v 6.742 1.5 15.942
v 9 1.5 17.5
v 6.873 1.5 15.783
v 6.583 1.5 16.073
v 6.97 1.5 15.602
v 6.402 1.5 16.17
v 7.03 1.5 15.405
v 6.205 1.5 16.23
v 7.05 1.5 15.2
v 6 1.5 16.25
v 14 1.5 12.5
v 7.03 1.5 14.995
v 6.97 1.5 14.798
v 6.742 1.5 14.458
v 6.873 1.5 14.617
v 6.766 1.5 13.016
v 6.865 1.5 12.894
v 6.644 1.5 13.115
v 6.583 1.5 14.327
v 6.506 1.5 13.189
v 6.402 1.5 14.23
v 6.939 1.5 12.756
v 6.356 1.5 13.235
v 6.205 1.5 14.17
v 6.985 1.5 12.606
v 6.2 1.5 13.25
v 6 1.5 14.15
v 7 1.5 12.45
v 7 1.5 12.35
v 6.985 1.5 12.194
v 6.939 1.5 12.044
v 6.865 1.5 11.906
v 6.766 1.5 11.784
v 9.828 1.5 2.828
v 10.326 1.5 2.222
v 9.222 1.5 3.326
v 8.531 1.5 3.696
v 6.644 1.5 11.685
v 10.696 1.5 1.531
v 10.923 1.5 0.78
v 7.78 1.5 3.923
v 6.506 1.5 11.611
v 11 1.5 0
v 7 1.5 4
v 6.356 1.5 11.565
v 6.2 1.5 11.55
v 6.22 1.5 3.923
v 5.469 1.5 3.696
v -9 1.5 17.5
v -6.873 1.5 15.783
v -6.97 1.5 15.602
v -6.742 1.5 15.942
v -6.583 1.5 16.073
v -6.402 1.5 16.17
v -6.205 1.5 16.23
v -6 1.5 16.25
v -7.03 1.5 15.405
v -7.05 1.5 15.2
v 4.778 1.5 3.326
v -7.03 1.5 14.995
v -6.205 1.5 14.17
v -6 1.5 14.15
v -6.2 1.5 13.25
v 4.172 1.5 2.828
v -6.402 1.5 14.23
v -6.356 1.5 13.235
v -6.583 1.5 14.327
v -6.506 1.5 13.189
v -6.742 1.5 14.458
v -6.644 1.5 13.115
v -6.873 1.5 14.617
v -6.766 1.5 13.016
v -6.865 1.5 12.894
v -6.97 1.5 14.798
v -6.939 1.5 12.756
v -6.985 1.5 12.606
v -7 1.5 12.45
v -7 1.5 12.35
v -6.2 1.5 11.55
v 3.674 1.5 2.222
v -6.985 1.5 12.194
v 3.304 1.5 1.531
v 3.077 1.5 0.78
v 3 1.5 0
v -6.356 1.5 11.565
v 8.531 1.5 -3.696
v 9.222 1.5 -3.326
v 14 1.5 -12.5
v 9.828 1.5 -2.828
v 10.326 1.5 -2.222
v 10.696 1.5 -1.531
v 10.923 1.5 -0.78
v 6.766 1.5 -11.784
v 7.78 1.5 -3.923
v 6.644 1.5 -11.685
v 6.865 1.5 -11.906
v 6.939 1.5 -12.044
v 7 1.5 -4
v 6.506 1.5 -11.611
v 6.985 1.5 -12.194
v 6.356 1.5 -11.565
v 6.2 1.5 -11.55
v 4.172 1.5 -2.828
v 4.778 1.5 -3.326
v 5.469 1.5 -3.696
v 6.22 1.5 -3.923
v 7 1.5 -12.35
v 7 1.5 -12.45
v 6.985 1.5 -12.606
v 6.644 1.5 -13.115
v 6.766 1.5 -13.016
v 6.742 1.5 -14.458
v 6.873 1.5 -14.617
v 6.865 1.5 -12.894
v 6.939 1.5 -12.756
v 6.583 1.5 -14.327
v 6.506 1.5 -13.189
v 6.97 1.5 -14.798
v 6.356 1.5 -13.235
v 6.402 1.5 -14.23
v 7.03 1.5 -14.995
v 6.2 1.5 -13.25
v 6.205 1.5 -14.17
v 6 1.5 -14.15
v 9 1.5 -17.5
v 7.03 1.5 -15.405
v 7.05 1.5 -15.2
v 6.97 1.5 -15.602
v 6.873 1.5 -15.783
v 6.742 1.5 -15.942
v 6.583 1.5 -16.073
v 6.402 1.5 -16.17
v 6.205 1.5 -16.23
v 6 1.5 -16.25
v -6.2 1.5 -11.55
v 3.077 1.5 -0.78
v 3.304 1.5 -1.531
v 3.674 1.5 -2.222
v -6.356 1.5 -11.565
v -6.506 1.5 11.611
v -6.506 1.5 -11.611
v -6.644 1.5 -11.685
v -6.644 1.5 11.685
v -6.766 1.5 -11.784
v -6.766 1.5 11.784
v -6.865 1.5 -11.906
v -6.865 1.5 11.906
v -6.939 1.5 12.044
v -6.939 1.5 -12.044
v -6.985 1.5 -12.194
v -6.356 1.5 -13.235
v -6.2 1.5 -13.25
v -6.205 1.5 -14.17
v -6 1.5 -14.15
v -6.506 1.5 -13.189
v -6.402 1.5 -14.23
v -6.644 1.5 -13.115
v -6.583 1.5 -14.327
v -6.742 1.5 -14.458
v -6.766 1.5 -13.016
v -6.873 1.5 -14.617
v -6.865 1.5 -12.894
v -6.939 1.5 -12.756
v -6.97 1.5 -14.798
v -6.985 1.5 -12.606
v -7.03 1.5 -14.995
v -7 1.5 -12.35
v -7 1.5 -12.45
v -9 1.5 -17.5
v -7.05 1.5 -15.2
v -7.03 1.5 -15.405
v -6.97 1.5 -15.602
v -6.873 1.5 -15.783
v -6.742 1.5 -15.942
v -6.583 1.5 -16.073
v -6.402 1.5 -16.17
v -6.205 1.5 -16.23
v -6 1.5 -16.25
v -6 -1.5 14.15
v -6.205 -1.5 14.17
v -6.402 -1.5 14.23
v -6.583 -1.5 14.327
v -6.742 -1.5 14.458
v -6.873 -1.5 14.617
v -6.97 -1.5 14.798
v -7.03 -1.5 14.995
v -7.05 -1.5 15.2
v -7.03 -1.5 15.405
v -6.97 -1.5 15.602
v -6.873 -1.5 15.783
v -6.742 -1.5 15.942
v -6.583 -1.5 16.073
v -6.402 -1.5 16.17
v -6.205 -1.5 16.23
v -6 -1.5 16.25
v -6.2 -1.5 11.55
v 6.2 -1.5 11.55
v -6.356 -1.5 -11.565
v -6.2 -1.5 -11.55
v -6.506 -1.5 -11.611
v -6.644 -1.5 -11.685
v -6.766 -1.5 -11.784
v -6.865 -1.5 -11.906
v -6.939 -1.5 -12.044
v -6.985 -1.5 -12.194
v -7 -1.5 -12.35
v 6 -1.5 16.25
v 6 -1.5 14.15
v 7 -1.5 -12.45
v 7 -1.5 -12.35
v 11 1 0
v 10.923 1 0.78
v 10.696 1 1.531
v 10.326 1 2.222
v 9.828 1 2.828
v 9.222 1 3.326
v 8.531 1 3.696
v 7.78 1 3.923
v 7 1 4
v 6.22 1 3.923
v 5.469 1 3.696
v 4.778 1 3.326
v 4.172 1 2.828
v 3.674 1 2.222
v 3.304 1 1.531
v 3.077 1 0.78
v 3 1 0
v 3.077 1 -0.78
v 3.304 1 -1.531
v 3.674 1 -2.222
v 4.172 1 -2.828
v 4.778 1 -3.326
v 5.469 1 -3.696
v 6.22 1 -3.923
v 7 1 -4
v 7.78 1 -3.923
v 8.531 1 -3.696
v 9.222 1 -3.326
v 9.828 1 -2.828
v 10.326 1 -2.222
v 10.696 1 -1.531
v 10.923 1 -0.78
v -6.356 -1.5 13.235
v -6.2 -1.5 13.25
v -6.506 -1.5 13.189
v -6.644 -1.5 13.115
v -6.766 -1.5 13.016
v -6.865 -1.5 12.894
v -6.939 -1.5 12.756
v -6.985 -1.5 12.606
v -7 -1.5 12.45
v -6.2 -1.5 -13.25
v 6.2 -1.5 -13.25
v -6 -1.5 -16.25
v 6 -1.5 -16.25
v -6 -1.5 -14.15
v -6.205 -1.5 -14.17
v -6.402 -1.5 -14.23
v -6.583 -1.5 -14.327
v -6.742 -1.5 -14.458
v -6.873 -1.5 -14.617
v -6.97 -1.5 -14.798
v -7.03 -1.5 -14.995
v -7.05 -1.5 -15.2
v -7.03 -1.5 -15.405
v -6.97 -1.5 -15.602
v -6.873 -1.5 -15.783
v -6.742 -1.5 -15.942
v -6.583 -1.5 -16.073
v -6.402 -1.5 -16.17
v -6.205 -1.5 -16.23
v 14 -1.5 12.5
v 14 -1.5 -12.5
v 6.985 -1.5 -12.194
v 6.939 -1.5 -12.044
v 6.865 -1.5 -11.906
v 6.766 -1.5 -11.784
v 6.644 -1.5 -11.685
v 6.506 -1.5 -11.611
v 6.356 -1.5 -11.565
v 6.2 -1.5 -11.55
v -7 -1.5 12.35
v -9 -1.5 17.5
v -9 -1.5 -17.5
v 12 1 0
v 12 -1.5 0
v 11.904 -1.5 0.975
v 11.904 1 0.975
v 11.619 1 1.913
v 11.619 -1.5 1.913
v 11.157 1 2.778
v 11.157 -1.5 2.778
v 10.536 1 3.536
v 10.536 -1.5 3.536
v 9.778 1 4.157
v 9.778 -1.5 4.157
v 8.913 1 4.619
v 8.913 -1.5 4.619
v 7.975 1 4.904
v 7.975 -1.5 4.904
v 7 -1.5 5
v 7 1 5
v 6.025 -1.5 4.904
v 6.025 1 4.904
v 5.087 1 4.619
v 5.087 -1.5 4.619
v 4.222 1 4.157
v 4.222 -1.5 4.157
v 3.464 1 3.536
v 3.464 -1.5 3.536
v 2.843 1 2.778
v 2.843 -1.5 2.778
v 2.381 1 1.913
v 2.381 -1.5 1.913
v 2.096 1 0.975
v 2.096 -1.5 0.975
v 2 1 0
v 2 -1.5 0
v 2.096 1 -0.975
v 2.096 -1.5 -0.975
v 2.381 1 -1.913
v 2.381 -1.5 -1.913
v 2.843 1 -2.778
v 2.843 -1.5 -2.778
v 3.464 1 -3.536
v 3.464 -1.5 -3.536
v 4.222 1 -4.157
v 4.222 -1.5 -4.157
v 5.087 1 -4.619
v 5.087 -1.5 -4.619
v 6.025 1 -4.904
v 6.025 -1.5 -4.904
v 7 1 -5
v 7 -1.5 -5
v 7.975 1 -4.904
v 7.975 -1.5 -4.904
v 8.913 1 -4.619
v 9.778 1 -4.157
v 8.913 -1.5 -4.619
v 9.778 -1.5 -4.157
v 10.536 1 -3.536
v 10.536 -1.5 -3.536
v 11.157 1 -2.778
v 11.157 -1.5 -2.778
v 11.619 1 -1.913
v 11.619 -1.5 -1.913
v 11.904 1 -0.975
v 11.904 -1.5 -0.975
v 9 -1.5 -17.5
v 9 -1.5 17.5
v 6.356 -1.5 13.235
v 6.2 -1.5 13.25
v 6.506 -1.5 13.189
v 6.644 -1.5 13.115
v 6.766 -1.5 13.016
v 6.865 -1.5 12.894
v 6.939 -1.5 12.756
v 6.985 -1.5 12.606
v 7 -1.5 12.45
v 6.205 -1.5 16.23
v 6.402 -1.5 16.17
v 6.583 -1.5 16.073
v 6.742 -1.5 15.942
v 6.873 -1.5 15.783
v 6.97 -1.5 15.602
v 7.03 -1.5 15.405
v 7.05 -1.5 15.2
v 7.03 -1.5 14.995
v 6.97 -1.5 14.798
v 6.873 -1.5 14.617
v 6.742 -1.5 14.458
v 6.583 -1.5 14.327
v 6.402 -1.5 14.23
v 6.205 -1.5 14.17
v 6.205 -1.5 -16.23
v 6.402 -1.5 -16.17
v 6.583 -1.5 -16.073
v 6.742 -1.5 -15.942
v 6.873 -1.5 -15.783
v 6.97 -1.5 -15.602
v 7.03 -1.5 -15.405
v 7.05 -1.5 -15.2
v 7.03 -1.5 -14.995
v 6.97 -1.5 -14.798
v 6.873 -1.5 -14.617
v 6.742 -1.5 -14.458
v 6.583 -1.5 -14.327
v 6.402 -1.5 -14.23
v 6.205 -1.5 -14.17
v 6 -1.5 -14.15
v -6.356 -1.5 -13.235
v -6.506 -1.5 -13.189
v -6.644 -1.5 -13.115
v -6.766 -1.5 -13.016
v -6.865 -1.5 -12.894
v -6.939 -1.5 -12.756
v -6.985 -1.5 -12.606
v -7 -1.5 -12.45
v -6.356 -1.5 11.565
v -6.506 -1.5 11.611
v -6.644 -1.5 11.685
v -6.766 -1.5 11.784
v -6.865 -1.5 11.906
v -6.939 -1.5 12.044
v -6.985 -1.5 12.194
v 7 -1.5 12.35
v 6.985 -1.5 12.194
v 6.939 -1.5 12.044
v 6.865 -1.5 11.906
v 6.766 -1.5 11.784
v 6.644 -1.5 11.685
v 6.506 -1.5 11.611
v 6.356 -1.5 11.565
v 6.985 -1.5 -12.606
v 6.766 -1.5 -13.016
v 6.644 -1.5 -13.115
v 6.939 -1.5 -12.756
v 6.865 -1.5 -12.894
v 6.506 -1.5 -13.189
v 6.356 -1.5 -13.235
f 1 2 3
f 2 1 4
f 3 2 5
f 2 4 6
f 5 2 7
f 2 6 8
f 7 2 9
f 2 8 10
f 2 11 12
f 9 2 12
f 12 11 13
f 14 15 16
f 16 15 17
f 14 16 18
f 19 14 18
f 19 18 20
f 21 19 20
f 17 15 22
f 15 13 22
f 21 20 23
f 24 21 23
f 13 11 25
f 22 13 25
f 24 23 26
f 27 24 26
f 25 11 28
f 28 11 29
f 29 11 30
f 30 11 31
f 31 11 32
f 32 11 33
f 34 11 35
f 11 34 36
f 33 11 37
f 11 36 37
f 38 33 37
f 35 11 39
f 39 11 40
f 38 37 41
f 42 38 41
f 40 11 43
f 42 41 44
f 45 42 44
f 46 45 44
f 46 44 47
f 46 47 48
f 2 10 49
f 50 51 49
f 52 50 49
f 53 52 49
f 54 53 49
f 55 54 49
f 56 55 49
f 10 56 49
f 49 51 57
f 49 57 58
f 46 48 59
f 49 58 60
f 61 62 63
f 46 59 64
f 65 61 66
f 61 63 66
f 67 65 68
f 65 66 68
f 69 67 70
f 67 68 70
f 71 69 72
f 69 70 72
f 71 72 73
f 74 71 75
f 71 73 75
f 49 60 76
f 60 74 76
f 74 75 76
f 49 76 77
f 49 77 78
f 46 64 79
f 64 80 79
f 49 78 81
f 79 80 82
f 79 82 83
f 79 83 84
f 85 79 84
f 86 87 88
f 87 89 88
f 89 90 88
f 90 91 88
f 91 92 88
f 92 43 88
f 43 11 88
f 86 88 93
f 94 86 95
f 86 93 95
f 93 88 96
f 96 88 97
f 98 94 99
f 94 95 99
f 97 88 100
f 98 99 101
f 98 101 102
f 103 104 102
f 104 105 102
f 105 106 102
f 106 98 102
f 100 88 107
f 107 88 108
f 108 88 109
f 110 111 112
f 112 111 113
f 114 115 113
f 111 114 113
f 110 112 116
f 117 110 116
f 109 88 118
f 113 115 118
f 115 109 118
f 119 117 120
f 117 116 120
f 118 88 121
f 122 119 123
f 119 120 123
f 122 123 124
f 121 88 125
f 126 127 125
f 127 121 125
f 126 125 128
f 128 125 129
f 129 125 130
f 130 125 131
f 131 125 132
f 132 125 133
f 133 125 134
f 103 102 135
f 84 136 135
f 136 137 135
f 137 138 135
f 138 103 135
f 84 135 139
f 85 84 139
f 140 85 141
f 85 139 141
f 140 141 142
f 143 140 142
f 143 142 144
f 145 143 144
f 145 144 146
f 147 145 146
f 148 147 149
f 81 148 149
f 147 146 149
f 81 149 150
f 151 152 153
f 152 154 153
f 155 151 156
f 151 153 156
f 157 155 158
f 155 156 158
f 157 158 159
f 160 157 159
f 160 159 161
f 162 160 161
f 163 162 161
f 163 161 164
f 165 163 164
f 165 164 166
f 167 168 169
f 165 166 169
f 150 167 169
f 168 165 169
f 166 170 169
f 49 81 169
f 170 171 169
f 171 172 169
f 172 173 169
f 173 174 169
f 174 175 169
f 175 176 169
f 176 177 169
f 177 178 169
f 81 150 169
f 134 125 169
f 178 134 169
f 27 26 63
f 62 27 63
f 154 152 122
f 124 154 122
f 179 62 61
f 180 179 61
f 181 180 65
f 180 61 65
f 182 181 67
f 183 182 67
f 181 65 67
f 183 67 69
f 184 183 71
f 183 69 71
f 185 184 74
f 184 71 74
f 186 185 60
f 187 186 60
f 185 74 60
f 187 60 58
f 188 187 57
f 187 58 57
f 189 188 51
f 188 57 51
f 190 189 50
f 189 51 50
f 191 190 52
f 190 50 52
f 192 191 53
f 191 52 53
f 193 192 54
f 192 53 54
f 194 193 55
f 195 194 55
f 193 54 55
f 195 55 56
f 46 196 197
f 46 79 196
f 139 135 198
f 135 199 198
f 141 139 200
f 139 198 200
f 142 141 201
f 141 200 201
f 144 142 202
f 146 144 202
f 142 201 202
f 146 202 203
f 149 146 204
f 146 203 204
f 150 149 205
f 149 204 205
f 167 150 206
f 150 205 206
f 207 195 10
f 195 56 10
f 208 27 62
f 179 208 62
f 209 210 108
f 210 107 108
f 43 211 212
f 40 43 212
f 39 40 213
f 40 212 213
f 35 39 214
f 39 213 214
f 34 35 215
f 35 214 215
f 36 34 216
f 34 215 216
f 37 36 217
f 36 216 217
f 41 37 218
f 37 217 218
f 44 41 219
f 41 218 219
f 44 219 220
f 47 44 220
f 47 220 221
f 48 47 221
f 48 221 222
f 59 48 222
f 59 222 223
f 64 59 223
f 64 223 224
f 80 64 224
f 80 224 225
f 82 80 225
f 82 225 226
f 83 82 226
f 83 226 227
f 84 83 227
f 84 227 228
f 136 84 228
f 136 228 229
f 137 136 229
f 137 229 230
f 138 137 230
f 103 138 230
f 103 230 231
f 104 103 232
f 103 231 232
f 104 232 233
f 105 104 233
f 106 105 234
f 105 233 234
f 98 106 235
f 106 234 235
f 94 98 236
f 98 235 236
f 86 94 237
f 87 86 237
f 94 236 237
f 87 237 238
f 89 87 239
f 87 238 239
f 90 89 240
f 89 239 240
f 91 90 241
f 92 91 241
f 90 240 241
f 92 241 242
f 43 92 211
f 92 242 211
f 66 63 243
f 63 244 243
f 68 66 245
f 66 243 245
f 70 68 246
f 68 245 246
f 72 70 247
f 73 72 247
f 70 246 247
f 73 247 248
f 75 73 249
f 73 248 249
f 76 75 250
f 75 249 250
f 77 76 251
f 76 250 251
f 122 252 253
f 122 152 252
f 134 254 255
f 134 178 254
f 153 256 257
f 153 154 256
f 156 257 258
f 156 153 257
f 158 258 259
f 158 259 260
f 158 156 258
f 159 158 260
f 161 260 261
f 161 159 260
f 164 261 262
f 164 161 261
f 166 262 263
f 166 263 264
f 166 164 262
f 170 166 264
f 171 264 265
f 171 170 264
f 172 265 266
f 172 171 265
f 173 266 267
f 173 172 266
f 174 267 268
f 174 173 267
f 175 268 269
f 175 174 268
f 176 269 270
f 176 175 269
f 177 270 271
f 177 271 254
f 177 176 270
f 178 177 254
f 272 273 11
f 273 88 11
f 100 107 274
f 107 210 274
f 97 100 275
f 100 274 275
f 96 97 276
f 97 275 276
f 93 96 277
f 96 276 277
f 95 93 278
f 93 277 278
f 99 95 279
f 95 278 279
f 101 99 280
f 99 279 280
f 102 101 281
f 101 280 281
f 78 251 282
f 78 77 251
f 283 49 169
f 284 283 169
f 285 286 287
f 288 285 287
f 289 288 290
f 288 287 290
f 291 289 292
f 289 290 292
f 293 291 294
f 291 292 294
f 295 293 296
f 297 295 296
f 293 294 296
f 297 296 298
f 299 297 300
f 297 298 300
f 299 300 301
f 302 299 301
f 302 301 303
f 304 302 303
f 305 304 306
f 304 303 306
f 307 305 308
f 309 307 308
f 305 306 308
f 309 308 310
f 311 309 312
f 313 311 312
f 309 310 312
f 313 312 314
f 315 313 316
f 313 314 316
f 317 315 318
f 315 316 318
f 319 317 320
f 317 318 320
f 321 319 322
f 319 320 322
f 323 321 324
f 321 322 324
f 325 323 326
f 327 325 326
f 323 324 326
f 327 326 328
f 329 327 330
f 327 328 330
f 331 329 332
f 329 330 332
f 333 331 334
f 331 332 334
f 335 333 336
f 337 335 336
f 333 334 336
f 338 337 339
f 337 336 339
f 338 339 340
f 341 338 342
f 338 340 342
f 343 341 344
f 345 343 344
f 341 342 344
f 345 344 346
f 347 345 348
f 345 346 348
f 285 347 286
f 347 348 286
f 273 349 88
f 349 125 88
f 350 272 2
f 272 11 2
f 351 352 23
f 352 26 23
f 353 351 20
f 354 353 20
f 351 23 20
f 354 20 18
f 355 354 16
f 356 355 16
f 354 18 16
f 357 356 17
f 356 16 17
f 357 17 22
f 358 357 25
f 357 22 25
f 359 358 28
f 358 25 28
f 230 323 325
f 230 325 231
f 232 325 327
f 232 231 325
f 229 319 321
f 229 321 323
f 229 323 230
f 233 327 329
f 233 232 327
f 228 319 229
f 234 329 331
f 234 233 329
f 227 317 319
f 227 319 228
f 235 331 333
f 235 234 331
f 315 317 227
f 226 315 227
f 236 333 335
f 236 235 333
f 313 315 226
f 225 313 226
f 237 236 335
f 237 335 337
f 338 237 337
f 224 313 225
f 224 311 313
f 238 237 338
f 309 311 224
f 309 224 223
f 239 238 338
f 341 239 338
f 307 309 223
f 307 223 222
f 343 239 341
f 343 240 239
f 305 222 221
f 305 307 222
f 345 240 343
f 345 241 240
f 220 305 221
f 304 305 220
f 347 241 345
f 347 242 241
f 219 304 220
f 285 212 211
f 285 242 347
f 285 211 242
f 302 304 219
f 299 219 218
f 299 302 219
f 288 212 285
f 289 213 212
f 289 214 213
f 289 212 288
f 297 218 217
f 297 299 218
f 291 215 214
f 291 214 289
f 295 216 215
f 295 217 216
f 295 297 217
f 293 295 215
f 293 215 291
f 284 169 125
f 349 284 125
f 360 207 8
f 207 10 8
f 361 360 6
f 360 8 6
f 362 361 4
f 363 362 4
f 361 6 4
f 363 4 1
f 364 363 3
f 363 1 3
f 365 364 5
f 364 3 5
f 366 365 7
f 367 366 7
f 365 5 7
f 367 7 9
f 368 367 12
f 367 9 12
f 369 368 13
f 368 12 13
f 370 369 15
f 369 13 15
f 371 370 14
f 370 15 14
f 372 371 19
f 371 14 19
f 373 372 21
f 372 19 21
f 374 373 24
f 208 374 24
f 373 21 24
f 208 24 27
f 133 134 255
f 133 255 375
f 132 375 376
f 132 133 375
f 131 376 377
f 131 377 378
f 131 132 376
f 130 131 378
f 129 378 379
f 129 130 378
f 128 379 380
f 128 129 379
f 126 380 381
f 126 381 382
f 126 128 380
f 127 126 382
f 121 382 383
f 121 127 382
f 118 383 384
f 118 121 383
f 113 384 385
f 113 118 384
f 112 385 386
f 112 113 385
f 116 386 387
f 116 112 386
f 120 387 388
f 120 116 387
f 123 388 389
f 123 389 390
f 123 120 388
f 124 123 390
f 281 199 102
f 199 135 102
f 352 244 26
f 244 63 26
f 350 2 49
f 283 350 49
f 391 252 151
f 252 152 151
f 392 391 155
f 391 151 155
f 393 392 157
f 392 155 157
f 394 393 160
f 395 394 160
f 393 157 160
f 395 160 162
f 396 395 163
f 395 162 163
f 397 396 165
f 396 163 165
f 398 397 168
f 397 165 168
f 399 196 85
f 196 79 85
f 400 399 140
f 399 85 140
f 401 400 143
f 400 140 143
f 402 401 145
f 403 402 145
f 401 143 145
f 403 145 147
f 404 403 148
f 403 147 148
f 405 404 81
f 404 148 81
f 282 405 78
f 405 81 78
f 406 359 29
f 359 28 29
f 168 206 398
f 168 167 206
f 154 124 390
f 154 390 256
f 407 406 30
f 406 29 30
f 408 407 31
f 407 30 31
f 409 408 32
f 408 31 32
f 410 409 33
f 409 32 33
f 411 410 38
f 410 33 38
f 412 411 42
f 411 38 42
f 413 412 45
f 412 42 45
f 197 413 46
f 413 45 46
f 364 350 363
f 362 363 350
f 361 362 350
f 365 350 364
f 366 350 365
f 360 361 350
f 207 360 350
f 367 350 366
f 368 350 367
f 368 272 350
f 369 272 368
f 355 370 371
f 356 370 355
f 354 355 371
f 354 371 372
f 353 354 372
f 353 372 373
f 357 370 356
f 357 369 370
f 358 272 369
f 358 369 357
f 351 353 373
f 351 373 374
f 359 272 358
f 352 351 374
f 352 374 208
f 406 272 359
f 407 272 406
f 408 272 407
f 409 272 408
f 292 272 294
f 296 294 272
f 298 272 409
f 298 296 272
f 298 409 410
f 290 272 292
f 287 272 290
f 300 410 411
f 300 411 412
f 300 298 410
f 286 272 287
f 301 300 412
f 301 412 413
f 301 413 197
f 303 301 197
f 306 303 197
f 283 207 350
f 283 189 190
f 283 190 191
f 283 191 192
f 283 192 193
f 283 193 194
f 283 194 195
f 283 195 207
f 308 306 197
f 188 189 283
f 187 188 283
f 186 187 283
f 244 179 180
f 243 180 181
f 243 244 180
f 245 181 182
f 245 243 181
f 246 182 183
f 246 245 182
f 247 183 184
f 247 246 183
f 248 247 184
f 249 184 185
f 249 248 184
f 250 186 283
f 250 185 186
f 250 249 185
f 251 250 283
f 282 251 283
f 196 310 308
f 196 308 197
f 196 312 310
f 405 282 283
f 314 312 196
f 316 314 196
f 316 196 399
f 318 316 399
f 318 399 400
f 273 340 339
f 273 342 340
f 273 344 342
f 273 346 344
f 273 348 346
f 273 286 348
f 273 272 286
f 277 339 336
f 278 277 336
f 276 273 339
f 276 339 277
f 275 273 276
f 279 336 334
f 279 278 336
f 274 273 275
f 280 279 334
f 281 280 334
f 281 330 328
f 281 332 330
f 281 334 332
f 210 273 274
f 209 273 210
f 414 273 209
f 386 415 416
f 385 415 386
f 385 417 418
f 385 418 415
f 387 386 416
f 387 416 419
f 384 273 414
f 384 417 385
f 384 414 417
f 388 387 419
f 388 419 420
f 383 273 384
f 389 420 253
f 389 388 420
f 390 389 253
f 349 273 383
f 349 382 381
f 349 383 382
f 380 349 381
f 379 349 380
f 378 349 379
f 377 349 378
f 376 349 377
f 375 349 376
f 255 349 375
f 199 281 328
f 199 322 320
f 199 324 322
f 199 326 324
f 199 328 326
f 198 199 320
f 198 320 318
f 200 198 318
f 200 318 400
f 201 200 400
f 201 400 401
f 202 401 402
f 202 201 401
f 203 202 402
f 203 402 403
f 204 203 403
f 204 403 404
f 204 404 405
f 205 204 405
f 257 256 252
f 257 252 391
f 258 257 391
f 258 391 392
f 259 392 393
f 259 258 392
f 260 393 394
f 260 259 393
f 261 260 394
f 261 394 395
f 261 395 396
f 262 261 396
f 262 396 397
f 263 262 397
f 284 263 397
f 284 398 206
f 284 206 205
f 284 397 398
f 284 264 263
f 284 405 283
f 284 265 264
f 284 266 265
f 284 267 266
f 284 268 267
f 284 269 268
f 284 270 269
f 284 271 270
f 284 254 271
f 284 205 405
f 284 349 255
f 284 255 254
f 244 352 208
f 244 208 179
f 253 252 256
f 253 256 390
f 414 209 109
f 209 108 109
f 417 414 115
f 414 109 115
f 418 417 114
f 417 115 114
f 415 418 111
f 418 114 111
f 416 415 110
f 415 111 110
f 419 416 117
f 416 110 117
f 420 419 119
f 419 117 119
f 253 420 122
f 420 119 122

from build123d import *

# Parameters (mm, degrees)
SKIZZE1_W                       = 14
SKIZZE1_H                       = 1.7
AUFSATZ_LINEAR_AUSTRAGEN1_DEPTH = 1.5
VERRUNDUNG1_R                   = 0.8
SKIZZE4_R                       = 5
SCHNITT_LINEAR_AUSTRAGEN1_DEPTH = 2.5
SKIZZE4_3_R                     = 4
SCHNITT_LINEAR_AUSTRAGEN2_DEPTH = 4


with BuildPart() as part:
    # Skizze1 → Aufsatz-Linear austragen1 (new body, symmetric)
    with BuildSketch(Plane(origin=(0, 0, 0), x_dir=(1, 0, 0), z_dir=(0, 1, 0))):
        Polygon((-9, 17.5), (9, 17.5), (14, 12.5), (14, -12.5), (9, -17.5), (-9, -17.5), align=None)
        with BuildLine():
            Line((-6, -16.25), (6, -16.25))
            ThreePointArc((6, -16.25), (7.05, -15.2), (6, -14.15))
            Line((6, -14.15), (-6, -14.15))
            ThreePointArc((-6, -14.15), (-7.05, -15.2), (-6, -16.25))
        make_face(mode=Mode.SUBTRACT)
        with Locations((0, 12.4)):
            Rectangle(SKIZZE1_W, SKIZZE1_H, mode=Mode.SUBTRACT)
        with BuildLine():
            Line((-6, 16.25), (6, 16.25))
            ThreePointArc((6, 16.25), (7.05, 15.2), (6, 14.15))
            Line((6, 14.15), (-6, 14.15))
            ThreePointArc((-6, 14.15), (-7.05, 15.2), (-6, 16.25))
        make_face(mode=Mode.SUBTRACT)
        with Locations((0, -12.4)):
            Rectangle(SKIZZE1_W, SKIZZE1_H, mode=Mode.SUBTRACT)
    extrude(amount=AUFSATZ_LINEAR_AUSTRAGEN1_DEPTH, both=True)

    # Verrundung1
    verrundung1_edges = [part.edges().sort_by_distance(p)[0] for p in [
        (-7, 0, -11.55),
        (-7, 0, -13.25),
        (7, 0, -13.25),
        (7, 0, -11.55),
        (7, 0, 13.25),
        (-7, 0, 13.25),
        (-7, 0, 11.55),
        (7, 0, 11.55),
    ]]
    fillet(verrundung1_edges, radius=VERRUNDUNG1_R)

    # Skizze4 → Schnitt-Linear austragen1 (cut)
    with BuildSketch(Plane.XZ.offset(1.5)):
        with Locations((7, 0)):
            Circle(SKIZZE4_R)
    extrude(amount=-SCHNITT_LINEAR_AUSTRAGEN1_DEPTH, mode=Mode.SUBTRACT)

    # Skizze4<3> → Schnitt-Linear austragen2 (cut, through all)
    with BuildSketch(Plane.XZ.offset(1.5)):
        with Locations((7, 0)):
            Circle(SKIZZE4_3_R)
    extrude(amount=-SCHNITT_LINEAR_AUSTRAGEN2_DEPTH, mode=Mode.SUBTRACT)


solid = part.part
